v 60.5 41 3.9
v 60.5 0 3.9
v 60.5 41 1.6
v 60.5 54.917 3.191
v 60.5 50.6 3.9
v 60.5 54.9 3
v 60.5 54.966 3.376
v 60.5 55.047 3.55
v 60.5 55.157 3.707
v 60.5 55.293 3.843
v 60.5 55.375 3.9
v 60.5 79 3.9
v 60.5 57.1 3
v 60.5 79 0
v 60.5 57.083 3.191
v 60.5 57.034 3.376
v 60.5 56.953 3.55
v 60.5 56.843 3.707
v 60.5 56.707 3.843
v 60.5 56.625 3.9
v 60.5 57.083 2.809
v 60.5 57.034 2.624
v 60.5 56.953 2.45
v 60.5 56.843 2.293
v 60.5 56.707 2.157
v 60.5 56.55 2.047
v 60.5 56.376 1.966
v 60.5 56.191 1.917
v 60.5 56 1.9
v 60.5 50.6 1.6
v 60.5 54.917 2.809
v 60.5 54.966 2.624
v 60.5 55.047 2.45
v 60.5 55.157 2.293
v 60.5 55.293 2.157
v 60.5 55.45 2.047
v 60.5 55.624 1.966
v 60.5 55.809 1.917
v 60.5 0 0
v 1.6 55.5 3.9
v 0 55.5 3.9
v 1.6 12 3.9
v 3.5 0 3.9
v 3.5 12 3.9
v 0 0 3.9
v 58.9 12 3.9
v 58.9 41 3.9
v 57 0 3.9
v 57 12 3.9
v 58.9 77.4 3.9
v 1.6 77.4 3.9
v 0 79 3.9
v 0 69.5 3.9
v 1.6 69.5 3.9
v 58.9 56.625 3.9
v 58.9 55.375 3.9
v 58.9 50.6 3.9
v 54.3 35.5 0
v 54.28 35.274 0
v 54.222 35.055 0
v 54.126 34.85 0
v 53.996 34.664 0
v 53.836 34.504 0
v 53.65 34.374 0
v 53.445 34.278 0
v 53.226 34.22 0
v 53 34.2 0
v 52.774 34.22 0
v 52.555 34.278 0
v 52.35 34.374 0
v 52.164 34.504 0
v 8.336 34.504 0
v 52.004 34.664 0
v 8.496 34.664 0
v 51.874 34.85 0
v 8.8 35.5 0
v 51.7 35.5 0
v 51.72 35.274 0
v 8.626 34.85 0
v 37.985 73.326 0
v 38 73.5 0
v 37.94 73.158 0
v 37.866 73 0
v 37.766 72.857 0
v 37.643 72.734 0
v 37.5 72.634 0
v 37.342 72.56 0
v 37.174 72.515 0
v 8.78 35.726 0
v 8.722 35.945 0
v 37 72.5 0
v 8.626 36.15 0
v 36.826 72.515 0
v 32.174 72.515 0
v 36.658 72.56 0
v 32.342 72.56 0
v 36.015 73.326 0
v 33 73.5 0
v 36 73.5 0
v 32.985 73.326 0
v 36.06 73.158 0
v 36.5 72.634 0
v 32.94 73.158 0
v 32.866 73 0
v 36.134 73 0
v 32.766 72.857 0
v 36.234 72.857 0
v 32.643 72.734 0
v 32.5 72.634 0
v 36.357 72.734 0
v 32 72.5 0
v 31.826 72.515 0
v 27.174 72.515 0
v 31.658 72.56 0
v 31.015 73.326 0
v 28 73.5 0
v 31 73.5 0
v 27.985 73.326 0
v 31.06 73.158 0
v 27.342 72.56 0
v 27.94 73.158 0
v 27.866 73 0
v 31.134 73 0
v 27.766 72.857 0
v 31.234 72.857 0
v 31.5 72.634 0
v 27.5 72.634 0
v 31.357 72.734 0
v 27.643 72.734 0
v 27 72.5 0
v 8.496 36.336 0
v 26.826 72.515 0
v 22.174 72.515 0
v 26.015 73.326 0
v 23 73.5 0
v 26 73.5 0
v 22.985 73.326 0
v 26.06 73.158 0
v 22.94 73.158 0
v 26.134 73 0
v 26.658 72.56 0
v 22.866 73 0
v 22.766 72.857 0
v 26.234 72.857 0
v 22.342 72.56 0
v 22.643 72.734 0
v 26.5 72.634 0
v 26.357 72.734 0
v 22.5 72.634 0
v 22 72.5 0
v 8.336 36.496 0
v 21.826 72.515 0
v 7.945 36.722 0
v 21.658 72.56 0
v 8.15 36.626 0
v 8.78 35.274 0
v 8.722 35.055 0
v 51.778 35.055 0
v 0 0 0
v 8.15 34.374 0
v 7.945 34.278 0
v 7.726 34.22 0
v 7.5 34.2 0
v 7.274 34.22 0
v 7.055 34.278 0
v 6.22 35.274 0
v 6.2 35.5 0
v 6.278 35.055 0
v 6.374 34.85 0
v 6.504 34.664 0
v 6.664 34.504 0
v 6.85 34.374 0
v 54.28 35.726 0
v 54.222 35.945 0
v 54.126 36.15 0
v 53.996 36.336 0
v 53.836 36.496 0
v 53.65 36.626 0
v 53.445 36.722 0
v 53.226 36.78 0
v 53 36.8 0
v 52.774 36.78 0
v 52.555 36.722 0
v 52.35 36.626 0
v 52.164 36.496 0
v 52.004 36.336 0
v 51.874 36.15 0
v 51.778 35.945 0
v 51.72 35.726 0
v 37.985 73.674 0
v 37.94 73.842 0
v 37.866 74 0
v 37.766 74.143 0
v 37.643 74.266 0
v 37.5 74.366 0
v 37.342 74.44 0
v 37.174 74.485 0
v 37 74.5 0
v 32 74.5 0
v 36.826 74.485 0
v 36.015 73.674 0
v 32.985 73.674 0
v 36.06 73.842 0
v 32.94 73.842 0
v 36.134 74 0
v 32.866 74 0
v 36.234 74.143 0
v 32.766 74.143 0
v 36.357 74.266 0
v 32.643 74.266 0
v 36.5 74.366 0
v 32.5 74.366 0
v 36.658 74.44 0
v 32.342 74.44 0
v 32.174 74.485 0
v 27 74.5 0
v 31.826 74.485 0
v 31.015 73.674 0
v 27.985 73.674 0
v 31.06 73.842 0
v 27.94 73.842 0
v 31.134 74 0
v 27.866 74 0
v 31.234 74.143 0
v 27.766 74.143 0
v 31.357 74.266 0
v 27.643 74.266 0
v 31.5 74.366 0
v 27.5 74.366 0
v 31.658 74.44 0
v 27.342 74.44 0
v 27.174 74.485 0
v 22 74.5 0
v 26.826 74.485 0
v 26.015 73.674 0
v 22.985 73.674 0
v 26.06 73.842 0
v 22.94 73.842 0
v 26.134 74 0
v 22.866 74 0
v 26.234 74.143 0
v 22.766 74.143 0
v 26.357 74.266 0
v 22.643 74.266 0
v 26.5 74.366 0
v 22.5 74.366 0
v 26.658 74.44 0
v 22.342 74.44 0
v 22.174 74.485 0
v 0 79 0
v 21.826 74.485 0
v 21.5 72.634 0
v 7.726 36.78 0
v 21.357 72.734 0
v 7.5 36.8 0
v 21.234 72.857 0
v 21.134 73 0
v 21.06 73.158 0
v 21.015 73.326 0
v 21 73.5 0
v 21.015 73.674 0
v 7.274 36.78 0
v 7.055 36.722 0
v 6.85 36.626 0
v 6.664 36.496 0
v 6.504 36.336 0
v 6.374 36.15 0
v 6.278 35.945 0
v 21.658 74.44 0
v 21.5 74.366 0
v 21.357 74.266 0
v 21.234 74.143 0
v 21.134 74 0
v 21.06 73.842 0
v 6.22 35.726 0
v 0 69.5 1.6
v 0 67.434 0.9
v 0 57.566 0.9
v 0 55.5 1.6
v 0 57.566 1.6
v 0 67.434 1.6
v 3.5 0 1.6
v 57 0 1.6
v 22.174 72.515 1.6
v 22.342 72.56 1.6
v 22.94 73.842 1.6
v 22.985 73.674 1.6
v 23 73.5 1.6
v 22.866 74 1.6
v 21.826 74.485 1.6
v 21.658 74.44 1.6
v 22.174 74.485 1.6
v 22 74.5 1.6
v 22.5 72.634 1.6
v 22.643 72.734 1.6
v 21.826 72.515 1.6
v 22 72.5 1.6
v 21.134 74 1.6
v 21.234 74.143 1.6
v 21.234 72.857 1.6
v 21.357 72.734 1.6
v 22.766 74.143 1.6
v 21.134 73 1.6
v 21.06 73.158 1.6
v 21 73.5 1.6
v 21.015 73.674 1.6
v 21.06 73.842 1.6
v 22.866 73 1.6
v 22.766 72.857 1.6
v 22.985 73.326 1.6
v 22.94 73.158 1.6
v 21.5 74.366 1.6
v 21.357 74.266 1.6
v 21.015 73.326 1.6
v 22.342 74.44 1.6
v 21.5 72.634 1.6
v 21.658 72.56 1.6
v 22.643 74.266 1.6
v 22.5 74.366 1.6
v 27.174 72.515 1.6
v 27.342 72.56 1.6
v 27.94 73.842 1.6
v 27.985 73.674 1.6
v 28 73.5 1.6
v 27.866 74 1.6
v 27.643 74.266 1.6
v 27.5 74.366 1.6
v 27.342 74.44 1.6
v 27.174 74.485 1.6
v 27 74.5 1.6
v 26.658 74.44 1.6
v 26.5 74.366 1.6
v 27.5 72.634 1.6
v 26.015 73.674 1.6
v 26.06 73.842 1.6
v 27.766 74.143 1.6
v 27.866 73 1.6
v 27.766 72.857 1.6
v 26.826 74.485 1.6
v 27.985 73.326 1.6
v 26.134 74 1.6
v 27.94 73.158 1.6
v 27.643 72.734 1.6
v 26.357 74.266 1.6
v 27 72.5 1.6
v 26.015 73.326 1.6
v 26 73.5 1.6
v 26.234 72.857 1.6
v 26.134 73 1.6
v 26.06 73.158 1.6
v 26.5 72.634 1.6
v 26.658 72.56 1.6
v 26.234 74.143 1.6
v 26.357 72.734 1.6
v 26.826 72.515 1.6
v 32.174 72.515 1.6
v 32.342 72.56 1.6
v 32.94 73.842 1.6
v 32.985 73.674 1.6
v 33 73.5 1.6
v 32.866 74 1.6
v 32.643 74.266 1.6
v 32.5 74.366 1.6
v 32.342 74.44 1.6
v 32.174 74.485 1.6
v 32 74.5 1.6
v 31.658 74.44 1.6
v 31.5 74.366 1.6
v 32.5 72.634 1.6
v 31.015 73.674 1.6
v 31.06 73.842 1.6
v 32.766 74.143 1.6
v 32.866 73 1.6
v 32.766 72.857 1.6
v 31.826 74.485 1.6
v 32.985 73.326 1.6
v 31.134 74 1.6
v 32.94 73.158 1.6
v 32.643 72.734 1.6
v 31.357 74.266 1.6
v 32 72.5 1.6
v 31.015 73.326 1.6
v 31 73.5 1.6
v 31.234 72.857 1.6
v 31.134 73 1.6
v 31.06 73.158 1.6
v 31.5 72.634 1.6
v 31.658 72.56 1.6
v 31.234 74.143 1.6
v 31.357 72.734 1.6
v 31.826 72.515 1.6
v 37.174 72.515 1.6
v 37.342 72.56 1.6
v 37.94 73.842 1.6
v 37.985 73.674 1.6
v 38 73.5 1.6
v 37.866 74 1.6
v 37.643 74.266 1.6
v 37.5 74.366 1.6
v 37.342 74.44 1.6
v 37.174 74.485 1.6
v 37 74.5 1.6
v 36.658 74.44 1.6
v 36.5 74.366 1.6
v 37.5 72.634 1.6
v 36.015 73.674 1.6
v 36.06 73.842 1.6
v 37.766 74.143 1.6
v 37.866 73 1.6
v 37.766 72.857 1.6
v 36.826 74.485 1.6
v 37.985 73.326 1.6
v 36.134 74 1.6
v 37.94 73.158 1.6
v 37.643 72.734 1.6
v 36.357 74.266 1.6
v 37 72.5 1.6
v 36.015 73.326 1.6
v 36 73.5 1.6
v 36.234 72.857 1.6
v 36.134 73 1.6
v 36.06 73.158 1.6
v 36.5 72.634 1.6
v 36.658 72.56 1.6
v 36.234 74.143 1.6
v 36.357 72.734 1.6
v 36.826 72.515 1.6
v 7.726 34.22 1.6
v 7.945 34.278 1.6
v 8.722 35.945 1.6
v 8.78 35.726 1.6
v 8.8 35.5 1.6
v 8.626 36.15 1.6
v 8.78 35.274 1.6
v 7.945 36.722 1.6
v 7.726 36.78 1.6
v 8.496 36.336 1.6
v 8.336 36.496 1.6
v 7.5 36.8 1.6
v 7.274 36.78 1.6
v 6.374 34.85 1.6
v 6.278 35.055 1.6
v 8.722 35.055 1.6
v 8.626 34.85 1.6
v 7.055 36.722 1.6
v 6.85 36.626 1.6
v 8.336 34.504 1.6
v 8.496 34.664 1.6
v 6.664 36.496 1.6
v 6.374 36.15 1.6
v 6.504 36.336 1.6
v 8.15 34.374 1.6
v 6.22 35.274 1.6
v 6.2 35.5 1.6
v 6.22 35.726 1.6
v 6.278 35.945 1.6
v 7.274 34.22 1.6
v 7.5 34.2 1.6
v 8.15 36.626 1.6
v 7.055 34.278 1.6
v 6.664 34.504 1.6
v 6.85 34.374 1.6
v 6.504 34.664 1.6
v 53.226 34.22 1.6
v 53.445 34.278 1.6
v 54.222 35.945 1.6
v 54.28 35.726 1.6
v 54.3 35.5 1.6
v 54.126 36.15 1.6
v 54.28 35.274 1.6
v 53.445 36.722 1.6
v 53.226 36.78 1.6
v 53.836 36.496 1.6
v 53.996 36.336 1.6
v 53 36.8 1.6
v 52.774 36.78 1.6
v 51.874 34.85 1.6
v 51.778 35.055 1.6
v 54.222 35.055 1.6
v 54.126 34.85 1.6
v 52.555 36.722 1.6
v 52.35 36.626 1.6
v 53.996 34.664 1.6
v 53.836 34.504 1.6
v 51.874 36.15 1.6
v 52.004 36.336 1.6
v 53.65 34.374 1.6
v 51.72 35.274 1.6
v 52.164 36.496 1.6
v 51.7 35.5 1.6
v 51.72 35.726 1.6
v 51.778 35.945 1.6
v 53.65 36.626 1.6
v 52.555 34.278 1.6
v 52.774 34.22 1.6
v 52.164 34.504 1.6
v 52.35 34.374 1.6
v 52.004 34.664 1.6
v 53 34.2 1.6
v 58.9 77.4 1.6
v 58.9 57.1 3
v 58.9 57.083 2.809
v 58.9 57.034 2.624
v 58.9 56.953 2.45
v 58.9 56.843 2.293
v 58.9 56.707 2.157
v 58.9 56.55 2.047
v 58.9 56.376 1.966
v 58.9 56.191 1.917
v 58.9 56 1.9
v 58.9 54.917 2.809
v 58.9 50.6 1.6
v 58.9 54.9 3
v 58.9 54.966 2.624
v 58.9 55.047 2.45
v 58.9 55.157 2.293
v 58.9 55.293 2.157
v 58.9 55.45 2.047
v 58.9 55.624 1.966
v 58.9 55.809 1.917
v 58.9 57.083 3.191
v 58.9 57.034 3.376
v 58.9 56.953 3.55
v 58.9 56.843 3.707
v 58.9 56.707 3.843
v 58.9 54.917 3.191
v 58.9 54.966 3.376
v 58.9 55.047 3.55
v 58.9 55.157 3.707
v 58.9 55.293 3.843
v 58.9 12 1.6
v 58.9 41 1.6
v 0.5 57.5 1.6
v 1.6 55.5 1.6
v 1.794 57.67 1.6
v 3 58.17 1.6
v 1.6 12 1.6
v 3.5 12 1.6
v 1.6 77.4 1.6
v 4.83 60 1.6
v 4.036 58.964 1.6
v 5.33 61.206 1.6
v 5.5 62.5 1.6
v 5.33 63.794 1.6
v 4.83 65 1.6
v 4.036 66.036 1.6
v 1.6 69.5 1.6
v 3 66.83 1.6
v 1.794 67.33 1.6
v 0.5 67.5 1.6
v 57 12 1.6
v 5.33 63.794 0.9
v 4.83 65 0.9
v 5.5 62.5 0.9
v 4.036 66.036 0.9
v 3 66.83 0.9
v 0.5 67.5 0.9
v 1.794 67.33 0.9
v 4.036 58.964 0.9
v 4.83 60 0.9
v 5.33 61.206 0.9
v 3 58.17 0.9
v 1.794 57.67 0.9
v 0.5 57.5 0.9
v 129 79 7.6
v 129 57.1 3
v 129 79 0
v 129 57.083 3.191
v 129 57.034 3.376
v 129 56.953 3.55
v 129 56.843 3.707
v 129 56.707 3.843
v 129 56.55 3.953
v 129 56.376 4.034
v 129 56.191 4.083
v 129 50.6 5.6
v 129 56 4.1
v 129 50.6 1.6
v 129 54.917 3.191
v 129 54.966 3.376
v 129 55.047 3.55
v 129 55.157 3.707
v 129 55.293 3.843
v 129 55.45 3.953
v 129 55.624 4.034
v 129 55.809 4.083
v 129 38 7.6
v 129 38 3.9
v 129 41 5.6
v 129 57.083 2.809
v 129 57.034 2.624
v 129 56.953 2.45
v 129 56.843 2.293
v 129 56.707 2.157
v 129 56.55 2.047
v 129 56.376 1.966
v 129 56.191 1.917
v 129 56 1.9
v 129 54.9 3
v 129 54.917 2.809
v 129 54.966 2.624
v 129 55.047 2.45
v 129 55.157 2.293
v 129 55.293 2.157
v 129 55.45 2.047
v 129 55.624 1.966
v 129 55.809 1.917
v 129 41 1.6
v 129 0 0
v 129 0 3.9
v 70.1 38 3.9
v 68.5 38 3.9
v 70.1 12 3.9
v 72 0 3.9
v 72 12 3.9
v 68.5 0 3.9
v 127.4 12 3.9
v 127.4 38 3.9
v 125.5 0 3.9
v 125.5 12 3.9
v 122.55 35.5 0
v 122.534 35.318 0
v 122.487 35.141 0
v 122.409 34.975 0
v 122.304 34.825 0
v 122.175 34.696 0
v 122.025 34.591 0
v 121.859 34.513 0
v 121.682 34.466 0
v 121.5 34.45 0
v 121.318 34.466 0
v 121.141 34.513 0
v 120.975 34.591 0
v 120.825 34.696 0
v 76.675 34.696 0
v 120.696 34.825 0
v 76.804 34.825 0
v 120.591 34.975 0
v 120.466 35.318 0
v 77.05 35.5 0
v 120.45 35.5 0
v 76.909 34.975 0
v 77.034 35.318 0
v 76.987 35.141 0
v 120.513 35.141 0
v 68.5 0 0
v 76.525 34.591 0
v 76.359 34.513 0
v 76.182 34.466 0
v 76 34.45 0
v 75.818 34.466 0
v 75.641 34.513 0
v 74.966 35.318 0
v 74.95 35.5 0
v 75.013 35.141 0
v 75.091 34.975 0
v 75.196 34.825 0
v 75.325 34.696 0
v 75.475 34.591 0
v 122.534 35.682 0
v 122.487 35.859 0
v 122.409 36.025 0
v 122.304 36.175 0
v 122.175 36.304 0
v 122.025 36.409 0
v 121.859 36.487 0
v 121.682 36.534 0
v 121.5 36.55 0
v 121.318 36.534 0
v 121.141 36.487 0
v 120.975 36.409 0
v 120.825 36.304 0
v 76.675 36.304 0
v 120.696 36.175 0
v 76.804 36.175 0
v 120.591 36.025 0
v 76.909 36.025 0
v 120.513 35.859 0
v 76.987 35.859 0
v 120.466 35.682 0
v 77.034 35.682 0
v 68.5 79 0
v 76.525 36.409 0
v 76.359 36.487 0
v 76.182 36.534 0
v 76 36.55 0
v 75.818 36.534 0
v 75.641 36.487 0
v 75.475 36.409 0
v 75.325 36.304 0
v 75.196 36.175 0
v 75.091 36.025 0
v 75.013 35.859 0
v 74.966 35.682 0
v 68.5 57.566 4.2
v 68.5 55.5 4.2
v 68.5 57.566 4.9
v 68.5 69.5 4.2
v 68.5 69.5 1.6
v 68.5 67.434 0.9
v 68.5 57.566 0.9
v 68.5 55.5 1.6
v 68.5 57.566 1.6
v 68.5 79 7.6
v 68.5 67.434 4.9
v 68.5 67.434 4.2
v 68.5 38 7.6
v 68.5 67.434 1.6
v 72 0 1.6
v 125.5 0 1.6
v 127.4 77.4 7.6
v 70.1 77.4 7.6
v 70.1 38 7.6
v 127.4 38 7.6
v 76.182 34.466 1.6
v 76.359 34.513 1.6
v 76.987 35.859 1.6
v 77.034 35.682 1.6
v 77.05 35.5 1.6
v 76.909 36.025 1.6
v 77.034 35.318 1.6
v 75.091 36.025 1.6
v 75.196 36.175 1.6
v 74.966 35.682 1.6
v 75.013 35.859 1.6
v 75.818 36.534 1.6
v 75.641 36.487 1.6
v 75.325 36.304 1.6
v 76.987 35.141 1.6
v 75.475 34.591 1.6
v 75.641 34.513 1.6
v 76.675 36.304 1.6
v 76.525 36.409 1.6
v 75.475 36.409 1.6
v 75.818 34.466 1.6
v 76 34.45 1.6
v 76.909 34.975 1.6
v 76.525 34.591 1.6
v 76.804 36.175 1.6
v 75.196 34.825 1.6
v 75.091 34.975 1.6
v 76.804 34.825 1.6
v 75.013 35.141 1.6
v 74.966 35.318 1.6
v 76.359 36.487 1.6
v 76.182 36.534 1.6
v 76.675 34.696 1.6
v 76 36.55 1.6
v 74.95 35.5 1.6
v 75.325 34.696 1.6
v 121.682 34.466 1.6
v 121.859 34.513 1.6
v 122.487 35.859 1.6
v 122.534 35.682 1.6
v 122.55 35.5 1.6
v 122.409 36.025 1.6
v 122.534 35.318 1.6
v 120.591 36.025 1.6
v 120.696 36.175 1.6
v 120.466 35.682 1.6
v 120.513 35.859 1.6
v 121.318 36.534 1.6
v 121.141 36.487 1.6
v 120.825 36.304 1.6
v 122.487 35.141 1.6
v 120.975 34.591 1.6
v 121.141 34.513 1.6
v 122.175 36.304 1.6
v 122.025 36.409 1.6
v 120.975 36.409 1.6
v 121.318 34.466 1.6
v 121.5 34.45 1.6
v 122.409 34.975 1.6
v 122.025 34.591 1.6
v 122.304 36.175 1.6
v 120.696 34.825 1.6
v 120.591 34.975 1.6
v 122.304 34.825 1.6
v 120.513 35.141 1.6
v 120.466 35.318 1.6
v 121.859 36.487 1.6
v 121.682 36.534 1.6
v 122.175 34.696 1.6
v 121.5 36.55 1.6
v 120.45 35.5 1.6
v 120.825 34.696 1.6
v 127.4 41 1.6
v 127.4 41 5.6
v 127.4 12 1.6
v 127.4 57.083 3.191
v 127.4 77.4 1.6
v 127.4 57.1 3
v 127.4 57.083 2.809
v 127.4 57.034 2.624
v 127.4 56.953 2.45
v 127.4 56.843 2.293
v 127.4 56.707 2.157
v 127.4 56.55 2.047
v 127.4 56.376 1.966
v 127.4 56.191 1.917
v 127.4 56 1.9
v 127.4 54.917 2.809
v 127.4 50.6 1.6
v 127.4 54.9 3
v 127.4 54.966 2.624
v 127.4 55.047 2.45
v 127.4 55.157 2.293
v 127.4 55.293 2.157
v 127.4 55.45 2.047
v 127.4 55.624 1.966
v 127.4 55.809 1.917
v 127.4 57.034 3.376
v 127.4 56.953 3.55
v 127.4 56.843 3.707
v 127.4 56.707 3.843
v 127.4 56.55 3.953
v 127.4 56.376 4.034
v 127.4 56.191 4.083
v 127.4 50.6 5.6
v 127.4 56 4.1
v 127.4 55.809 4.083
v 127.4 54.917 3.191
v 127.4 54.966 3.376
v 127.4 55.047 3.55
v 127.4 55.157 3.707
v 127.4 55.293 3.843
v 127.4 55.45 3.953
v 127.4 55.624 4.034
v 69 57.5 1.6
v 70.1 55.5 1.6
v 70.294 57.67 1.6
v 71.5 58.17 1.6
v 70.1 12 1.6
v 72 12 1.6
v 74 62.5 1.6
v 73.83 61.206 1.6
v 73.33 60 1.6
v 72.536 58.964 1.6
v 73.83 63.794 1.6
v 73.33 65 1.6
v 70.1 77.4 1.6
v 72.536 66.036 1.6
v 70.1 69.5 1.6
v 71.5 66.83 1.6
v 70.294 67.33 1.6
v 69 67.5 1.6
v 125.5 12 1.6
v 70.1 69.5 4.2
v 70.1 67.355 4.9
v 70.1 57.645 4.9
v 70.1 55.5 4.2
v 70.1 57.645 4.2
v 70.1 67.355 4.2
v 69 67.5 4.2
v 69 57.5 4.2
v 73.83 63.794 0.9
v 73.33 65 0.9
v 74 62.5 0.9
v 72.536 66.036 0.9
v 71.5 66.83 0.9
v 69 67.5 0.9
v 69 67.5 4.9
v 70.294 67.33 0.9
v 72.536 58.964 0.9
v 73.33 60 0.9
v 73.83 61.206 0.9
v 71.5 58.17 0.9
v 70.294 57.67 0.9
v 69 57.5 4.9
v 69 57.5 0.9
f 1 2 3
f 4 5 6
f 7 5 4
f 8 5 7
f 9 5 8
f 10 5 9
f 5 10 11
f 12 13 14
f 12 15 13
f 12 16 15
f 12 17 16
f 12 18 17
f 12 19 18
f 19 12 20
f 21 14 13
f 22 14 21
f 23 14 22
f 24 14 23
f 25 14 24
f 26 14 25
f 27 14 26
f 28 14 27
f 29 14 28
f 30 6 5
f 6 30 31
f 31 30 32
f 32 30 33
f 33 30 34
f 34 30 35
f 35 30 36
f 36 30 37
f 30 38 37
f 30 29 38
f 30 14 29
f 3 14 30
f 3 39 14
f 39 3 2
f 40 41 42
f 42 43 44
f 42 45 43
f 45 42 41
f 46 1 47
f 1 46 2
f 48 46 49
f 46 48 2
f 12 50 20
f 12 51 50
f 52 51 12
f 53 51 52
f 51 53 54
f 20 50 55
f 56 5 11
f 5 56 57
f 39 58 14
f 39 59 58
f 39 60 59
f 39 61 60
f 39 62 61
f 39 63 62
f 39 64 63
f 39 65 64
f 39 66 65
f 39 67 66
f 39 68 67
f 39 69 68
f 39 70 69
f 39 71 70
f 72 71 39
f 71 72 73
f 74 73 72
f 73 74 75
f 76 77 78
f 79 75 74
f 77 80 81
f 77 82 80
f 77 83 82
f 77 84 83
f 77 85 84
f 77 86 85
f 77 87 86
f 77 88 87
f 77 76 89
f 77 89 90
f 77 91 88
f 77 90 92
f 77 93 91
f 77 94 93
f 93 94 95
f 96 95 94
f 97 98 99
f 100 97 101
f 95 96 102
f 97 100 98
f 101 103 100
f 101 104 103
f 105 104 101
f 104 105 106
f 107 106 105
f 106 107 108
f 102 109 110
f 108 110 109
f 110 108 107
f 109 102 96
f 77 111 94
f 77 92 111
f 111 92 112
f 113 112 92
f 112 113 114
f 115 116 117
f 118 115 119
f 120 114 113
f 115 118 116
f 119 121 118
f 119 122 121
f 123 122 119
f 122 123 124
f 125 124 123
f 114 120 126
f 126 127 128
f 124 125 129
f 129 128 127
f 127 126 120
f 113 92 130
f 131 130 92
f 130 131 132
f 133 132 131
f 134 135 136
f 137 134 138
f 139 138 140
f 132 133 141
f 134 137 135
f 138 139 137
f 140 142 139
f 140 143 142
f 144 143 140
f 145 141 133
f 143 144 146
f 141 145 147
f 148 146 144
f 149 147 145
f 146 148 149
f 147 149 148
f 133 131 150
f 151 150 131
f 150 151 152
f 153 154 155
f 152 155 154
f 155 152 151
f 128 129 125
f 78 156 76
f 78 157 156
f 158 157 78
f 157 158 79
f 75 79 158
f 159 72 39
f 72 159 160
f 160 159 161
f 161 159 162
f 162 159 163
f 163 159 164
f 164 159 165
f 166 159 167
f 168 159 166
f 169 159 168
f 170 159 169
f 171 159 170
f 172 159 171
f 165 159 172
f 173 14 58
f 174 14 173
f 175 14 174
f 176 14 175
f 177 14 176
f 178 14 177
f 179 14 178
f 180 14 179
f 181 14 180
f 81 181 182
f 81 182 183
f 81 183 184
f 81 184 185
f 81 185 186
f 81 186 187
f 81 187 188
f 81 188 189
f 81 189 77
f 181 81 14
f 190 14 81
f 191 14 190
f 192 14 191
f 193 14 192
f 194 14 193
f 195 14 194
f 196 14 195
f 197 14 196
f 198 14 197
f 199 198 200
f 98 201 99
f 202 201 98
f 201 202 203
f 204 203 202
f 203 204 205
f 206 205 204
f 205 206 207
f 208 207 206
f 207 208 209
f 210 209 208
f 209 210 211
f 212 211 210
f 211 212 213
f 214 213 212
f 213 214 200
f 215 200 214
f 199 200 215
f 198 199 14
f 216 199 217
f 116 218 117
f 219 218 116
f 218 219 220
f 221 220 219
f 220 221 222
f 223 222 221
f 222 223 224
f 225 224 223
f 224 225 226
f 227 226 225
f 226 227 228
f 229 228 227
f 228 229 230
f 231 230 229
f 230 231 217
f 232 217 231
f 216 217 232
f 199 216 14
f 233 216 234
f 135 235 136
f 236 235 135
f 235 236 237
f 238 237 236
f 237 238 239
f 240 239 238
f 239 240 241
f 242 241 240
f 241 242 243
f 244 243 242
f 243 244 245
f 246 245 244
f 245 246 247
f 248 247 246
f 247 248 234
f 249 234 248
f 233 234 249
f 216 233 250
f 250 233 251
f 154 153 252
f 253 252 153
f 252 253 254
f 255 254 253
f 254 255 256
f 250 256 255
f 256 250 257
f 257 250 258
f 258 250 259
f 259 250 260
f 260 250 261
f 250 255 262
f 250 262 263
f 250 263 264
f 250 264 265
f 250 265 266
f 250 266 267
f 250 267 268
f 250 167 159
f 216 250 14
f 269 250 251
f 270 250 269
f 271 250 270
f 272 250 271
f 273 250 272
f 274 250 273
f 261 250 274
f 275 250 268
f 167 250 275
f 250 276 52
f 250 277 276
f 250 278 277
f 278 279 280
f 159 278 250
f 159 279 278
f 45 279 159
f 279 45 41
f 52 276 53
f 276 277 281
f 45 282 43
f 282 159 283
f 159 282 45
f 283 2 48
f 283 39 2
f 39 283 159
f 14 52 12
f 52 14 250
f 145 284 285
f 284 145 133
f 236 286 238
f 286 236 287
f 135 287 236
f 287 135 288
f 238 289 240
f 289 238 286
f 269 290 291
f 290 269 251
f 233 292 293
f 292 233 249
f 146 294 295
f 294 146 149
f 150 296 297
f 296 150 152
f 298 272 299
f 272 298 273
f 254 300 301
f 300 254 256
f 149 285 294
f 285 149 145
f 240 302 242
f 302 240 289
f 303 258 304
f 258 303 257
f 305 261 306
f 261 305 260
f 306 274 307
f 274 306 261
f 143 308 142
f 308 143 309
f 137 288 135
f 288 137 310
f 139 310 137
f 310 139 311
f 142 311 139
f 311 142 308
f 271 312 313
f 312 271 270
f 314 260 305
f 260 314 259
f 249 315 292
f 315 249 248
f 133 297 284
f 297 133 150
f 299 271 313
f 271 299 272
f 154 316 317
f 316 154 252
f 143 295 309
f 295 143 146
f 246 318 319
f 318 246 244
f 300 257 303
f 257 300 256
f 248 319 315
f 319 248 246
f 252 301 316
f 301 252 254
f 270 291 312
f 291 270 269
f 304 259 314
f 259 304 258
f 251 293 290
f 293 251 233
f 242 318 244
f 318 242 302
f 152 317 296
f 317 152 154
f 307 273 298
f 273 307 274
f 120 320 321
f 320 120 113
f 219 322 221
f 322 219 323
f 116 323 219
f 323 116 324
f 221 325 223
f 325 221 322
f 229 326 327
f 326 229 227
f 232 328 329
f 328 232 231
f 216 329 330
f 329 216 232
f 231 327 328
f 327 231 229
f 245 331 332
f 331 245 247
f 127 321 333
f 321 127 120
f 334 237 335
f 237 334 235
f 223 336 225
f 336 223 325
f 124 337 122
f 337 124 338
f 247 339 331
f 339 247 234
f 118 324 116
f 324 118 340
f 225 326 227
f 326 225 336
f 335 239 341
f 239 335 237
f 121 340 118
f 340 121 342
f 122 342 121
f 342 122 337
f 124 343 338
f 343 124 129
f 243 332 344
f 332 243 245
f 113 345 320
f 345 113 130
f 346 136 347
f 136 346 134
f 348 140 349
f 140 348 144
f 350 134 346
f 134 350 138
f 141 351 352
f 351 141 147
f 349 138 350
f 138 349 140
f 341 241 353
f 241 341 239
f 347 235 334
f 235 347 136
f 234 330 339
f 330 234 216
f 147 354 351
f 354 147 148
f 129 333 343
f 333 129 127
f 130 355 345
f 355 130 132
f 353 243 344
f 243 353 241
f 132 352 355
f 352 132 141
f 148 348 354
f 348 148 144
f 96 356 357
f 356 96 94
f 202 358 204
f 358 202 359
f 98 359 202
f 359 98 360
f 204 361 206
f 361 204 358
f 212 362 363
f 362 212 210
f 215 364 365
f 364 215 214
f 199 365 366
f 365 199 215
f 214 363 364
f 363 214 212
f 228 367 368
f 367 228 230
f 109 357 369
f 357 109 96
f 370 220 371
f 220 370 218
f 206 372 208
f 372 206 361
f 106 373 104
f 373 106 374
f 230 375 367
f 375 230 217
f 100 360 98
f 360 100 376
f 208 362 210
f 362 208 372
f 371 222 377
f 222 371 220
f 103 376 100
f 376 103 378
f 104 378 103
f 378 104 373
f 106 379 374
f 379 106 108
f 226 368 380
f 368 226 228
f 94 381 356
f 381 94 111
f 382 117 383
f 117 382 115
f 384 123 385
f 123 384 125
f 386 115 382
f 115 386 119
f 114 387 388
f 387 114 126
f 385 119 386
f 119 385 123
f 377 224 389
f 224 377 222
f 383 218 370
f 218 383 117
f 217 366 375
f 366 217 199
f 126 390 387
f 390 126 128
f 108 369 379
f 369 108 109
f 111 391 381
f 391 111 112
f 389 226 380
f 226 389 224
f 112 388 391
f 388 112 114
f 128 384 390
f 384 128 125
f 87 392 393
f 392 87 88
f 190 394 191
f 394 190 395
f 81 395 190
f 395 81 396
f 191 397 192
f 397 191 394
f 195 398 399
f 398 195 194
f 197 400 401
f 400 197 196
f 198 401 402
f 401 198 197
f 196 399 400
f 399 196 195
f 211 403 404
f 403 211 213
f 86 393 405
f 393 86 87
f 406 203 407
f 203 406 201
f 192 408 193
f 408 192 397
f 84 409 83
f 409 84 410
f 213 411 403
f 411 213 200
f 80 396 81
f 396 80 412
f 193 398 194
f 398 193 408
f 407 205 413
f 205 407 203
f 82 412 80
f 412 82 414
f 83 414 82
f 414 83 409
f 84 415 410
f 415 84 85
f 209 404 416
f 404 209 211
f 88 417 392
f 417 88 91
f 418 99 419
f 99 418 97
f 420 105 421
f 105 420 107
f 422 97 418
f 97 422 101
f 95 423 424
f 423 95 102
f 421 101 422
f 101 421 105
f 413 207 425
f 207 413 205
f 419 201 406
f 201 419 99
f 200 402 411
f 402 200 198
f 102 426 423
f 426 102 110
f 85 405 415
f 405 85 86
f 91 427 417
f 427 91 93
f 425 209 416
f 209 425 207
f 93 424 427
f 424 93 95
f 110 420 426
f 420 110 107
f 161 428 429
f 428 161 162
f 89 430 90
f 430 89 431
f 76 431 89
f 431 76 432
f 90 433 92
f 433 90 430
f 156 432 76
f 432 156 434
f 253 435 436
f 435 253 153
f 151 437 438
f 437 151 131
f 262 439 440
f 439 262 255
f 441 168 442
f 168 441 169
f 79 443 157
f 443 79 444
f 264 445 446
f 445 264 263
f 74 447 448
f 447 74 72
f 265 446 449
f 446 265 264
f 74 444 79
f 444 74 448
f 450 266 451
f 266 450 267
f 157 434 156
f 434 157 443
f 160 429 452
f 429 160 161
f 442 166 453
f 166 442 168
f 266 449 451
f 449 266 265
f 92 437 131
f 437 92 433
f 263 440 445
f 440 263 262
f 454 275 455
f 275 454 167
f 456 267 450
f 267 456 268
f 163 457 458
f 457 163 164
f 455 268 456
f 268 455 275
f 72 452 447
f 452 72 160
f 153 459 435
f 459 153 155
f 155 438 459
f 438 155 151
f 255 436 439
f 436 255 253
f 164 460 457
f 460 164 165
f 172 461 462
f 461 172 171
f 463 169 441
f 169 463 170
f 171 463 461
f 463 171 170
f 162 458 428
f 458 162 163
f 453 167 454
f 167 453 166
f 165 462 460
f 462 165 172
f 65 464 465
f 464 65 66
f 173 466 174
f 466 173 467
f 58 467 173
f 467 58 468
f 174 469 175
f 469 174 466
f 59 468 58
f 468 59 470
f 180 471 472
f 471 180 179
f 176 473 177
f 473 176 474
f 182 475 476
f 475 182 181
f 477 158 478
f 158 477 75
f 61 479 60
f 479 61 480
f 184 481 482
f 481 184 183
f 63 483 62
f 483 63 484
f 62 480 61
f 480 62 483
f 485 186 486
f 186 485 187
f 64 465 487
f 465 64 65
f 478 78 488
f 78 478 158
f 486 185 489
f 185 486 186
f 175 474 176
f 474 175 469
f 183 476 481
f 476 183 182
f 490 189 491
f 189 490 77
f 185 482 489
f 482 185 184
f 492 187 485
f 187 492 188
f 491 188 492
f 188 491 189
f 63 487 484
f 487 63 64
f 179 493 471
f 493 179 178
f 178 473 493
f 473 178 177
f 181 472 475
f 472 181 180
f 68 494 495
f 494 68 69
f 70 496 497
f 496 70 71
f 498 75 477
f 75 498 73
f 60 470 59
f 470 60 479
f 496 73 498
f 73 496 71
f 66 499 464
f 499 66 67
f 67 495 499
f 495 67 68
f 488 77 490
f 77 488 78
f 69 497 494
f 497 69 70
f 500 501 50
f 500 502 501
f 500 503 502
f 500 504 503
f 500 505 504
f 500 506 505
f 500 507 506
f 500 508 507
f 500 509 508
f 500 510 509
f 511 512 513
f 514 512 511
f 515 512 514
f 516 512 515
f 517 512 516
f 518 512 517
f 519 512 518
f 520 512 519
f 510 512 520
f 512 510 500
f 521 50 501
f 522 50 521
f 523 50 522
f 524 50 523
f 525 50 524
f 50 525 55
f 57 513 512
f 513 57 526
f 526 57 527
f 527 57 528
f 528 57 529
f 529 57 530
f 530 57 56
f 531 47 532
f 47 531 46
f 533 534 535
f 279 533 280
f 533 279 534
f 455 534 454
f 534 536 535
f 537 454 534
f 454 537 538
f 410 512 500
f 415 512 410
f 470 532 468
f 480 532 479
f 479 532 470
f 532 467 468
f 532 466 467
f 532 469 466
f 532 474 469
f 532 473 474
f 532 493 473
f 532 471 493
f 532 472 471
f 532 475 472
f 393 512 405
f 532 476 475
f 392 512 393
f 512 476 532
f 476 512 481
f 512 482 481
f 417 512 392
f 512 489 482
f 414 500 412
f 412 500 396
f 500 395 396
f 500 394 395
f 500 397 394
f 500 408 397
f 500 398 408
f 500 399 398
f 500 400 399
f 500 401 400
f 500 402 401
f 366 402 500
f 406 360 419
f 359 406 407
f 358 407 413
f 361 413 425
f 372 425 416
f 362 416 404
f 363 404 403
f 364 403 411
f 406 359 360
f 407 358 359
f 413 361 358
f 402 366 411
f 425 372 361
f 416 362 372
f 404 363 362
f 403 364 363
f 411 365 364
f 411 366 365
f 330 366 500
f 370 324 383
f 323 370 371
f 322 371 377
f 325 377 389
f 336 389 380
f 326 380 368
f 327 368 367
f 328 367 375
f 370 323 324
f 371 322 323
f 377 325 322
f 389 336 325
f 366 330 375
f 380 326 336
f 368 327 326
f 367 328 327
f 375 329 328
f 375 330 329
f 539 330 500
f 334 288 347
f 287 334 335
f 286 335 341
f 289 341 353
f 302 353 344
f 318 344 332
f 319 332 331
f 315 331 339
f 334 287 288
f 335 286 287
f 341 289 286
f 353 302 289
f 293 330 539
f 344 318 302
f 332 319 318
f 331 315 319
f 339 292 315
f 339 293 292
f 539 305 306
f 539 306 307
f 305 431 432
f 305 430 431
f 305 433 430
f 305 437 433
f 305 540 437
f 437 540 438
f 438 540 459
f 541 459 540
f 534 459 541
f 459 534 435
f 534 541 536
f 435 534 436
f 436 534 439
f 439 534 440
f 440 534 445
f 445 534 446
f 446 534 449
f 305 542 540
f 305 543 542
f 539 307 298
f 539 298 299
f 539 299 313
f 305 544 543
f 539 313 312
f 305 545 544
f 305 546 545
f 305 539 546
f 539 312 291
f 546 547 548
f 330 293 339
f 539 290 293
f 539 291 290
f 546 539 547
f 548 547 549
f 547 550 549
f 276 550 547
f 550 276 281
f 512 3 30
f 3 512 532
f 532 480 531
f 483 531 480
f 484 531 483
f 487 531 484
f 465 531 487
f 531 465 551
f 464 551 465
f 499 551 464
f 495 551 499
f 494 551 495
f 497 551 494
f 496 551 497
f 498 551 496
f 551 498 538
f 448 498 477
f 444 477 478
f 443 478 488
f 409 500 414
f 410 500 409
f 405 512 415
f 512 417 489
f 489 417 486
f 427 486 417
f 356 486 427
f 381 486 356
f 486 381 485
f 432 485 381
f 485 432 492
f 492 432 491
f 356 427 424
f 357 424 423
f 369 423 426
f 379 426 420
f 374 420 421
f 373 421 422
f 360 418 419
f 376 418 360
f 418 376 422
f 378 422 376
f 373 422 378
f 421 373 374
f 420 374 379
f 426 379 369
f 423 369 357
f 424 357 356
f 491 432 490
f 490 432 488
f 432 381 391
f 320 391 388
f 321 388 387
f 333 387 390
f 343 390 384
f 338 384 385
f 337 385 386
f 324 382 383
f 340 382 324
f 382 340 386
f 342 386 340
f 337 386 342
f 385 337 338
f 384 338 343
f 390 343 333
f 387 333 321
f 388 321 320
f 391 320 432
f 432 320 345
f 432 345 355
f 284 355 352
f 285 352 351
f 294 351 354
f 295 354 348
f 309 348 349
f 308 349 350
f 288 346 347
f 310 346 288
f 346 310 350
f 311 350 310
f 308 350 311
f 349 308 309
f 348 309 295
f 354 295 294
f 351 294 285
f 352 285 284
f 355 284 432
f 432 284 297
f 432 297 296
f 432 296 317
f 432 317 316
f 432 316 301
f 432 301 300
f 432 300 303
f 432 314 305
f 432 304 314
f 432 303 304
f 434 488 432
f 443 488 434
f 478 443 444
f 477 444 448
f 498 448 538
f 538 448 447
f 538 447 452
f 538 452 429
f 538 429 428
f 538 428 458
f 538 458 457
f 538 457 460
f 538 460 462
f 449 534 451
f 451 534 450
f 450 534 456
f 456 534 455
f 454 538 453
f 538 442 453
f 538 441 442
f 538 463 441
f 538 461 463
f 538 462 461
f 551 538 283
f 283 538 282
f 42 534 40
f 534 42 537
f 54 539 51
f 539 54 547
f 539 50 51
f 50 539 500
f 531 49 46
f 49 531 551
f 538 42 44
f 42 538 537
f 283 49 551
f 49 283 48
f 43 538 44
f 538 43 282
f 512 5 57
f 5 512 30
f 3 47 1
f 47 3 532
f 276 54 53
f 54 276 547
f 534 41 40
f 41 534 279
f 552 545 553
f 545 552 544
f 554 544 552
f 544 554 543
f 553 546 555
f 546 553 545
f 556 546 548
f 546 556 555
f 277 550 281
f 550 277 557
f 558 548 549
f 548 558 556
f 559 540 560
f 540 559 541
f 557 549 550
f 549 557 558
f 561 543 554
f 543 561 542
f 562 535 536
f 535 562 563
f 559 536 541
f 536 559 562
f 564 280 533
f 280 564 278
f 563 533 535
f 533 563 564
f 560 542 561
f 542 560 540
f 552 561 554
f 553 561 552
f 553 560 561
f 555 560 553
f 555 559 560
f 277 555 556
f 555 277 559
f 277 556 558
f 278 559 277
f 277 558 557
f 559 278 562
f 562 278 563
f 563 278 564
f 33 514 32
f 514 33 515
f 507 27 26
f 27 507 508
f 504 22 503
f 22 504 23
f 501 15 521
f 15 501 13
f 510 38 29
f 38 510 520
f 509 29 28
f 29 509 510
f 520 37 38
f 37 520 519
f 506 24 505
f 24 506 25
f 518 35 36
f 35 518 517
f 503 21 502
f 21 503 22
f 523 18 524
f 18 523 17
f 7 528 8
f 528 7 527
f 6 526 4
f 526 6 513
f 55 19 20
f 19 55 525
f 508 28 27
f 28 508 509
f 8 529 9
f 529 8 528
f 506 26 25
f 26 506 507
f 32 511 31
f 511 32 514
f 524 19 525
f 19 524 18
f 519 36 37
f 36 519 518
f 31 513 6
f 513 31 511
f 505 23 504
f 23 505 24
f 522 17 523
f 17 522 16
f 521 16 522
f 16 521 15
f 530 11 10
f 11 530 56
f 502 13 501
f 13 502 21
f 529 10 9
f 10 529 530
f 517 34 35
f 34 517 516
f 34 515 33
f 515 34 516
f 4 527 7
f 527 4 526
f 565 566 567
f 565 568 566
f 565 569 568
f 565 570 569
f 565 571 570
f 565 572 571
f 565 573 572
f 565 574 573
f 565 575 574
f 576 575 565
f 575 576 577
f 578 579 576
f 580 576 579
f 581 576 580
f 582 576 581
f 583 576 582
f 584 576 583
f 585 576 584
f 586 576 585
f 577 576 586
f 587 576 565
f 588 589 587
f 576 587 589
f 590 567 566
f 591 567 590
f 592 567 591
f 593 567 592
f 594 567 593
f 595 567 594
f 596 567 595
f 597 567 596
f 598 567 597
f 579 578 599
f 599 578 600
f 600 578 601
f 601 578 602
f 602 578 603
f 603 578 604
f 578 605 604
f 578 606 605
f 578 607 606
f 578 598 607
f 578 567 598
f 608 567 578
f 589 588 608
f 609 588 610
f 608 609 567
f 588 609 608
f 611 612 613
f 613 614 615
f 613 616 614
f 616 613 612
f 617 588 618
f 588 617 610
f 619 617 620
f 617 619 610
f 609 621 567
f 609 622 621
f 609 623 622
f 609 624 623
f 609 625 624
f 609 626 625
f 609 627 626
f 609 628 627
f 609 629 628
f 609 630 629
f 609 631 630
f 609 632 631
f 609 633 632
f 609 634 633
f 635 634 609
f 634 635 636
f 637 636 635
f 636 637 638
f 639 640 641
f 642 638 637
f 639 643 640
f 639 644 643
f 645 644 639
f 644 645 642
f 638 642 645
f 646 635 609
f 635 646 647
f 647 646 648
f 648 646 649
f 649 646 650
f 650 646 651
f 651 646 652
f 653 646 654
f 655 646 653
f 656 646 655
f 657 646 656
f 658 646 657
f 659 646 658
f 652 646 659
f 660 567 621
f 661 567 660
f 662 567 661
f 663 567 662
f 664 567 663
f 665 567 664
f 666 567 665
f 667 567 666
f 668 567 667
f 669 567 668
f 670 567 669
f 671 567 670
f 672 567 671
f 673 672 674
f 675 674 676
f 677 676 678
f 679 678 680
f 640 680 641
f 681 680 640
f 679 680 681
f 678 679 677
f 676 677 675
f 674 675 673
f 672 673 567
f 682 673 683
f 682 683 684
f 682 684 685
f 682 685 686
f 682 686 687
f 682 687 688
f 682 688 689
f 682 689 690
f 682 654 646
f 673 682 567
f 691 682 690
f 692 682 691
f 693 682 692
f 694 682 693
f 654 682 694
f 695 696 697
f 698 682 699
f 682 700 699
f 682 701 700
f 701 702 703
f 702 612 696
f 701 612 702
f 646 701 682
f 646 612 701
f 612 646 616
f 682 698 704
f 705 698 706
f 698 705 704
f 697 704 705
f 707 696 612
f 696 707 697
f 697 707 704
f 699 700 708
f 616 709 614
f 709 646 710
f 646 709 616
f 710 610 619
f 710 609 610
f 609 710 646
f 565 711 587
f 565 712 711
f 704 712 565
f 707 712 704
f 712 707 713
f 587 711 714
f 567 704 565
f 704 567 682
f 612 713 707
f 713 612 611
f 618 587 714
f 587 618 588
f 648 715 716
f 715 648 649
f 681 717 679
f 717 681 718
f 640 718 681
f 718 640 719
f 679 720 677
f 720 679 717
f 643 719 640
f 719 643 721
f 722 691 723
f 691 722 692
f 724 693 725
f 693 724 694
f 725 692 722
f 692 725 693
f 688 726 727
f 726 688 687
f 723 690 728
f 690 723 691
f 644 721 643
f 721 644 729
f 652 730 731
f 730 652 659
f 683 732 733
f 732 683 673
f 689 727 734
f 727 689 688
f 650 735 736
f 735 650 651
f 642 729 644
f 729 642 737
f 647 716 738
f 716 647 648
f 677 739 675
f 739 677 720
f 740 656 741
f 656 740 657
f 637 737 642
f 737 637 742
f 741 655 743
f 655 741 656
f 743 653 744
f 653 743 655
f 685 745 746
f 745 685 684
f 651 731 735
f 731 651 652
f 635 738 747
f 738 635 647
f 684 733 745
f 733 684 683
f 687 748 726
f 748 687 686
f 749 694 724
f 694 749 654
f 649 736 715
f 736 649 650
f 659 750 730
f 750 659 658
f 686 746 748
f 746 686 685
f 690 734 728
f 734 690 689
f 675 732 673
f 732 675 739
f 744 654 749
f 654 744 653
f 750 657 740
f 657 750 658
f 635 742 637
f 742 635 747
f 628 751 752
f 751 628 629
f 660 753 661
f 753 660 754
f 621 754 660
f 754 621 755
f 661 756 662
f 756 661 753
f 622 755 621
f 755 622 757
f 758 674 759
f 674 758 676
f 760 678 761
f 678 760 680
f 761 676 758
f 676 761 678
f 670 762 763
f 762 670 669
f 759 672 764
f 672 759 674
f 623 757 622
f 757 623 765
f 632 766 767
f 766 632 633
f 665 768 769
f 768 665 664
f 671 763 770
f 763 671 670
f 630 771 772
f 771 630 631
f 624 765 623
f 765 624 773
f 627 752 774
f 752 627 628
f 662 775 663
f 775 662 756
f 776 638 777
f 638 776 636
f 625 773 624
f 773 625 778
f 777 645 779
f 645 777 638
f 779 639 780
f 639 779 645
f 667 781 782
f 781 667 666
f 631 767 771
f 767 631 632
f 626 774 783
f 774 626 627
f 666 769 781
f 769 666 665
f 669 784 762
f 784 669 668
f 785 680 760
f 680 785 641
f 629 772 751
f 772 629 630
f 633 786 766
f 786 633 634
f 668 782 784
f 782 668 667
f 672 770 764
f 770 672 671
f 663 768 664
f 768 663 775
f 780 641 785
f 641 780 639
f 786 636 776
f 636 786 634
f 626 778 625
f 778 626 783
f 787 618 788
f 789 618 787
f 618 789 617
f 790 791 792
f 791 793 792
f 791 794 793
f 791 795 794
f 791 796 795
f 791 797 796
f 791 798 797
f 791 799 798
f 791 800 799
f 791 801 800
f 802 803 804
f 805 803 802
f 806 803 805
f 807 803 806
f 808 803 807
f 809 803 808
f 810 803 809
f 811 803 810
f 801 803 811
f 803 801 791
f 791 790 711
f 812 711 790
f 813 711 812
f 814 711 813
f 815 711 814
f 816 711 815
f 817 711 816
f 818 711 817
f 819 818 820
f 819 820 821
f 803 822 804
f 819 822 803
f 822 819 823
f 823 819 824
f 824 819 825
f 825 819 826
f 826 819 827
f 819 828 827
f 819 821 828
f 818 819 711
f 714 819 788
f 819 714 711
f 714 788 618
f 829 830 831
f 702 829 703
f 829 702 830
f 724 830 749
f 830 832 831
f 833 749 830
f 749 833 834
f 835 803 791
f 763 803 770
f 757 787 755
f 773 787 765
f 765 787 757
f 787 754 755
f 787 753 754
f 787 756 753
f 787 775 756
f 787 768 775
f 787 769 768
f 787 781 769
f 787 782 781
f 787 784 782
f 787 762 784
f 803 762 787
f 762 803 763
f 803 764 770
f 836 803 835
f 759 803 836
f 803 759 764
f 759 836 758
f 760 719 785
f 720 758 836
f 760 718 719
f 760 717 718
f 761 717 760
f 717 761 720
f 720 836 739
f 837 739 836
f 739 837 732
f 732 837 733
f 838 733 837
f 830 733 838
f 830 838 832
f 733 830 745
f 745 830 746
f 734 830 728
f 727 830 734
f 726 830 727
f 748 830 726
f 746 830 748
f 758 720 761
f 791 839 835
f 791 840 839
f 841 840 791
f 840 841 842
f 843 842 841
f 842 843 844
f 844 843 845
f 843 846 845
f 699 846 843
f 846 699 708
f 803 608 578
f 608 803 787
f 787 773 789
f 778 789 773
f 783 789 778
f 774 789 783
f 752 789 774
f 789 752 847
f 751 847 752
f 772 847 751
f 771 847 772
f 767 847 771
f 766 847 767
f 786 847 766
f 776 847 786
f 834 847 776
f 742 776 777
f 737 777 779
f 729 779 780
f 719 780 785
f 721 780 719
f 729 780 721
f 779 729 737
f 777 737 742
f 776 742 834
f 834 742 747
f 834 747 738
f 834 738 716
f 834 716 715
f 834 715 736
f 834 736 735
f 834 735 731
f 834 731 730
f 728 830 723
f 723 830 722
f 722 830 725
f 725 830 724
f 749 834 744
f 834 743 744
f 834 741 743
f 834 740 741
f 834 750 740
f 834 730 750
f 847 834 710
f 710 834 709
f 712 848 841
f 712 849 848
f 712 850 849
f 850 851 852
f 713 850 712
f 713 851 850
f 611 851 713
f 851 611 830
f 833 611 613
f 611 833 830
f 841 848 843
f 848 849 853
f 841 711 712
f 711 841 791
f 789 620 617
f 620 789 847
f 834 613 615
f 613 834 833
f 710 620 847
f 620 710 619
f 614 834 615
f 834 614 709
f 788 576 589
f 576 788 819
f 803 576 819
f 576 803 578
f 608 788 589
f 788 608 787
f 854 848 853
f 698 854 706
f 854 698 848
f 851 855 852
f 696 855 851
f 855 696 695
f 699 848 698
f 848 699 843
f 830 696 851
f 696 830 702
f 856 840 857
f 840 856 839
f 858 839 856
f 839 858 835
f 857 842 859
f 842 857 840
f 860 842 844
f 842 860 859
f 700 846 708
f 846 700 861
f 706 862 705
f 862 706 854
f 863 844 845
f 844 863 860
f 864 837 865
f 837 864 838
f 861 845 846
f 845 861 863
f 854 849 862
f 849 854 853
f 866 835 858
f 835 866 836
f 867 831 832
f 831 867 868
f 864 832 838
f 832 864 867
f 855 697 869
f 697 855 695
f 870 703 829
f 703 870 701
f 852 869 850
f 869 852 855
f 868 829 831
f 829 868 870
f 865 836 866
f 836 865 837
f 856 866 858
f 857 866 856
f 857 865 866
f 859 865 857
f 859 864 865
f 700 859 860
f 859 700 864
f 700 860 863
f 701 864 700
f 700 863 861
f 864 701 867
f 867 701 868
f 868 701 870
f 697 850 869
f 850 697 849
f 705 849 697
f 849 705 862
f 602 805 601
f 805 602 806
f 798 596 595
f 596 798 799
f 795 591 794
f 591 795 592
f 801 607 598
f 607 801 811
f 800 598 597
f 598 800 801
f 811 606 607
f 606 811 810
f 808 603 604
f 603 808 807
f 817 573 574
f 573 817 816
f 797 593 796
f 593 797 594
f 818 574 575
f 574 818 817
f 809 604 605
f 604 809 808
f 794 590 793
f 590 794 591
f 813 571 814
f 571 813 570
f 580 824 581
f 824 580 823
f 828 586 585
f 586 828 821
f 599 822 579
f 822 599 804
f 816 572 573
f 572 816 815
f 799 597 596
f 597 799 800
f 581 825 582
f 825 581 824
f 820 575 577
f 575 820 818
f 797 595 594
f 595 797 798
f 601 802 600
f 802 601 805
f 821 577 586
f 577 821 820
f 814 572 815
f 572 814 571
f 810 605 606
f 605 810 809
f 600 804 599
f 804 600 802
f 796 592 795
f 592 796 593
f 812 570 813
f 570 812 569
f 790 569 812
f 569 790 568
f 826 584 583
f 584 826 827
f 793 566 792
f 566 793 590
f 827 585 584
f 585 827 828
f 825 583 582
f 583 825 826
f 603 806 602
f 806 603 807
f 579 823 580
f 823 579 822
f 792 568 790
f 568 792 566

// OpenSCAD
// DeadOrPocket Compute Cartridge — Parametric 3D-Printable Enclosure (OpenSCAD)
// Fits standard Analogue Pocket / Game Boy cartridge slot (5V sense shoulder preserved!)
// Print in PLA/PETG/Resin (0.16 mm layer height, no supports needed when laid flat).

$fn = 36;

// External Cartridge Dimensions (mm)
cart_w        = 60.5;   // Fits 61.0 mm Pocket cartridge bay cleanly
cart_lower_h  = 39.0;   // Portion inserted inside Analogue Pocket slot
cart_upper_h  = 40.0;   // Extended upper housing above Pocket top lip (like GB Camera)
cart_total_h  = cart_lower_h + cart_upper_h; // 79.0 mm total
cart_lower_t  = 7.8;    // Standard GB/GBC cartridge thickness (keeps 5V sense switch active!)
cart_upper_t  = 11.5;   // Extra headroom above Pocket for BGA heatsink + USB-C + MicroSD
wall          = 1.6;
pcb_t         = 1.0;

module half_shell(is_front = true) {
    difference() {
        union() {
            // Lower slot tongue (standard GB/GBC 5V geometry - NO GBA notch!)
            cube([cart_w, cart_lower_h, cart_lower_t / 2]);
            // Upper electronics housing (slightly thicker on rear side to clear Pocket back)
            translate([0, cart_lower_h - 1.0, 0])
                cube([cart_w, cart_upper_h + 1.0, is_front ? (cart_lower_t / 2) : (cart_upper_t - cart_lower_t / 2)]);
        }
        // Inner PCB cavity
        translate([wall, 12.0, wall])
            cube([cart_w - 2*wall, cart_total_h - 12.0 - wall, 12.0]);
        // Bottom 32-pin gold edge finger opening
        translate([3.5, -0.5, wall])
            cube([cart_w - 7.0, 13.0, 10.0]);
        // Side USB-C Auxiliary Power Cutout (Right side, y = 45 mm)
        translate([cart_w - wall - 1.0, 41.0, wall])
            cube([wall + 2.0, 9.6, 4.0]);
        // Side MicroSD Slot (Left side, y = 62 mm) — 100% Flush / Recessed design
        // Card sits 0.5 mm recessed INSIDE shell with an ergonomic fingernail crescent notch
        translate([-1.0, 55.5, wall])
            cube([wall + 2.0, 14.0, 2.6]);
        translate([0.5, 62.5, wall + 1.3])
            cylinder(r = 5.0, h = 4.0, center = true, $fn = 24);
        // Recessed Tactile Reset Pinhole (Right side, y = 56 mm)
        translate([cart_w - wall - 1.0, 56.0, 3.0])
            rotate([0, 90, 0]) cylinder(h = wall + 2.0, d = 2.2);
        // 4 Diagnostic LED Light-Pipe Windows (Top edge, front half only)
        if (is_front) {
            for (i = [0:3]) {
                translate([22.0 + i*5.0, cart_total_h - 5.5, -0.5])
                    cylinder(h = wall + 1.0, d = 2.0);
            }
        }
        // M2.5 screw bosses through-holes
        for (mx = [7.5, cart_w - 7.5]) {
            translate([mx, 35.5, -0.5]) cylinder(h = 15.0, d = is_front ? 2.6 : 2.1);
        }
    }
}

// Render front & back halves side-by-side ready for slicing
translate([0, 0, 0])          half_shell(true);
translate([cart_w + 8, 0, 0]) half_shell(false);
